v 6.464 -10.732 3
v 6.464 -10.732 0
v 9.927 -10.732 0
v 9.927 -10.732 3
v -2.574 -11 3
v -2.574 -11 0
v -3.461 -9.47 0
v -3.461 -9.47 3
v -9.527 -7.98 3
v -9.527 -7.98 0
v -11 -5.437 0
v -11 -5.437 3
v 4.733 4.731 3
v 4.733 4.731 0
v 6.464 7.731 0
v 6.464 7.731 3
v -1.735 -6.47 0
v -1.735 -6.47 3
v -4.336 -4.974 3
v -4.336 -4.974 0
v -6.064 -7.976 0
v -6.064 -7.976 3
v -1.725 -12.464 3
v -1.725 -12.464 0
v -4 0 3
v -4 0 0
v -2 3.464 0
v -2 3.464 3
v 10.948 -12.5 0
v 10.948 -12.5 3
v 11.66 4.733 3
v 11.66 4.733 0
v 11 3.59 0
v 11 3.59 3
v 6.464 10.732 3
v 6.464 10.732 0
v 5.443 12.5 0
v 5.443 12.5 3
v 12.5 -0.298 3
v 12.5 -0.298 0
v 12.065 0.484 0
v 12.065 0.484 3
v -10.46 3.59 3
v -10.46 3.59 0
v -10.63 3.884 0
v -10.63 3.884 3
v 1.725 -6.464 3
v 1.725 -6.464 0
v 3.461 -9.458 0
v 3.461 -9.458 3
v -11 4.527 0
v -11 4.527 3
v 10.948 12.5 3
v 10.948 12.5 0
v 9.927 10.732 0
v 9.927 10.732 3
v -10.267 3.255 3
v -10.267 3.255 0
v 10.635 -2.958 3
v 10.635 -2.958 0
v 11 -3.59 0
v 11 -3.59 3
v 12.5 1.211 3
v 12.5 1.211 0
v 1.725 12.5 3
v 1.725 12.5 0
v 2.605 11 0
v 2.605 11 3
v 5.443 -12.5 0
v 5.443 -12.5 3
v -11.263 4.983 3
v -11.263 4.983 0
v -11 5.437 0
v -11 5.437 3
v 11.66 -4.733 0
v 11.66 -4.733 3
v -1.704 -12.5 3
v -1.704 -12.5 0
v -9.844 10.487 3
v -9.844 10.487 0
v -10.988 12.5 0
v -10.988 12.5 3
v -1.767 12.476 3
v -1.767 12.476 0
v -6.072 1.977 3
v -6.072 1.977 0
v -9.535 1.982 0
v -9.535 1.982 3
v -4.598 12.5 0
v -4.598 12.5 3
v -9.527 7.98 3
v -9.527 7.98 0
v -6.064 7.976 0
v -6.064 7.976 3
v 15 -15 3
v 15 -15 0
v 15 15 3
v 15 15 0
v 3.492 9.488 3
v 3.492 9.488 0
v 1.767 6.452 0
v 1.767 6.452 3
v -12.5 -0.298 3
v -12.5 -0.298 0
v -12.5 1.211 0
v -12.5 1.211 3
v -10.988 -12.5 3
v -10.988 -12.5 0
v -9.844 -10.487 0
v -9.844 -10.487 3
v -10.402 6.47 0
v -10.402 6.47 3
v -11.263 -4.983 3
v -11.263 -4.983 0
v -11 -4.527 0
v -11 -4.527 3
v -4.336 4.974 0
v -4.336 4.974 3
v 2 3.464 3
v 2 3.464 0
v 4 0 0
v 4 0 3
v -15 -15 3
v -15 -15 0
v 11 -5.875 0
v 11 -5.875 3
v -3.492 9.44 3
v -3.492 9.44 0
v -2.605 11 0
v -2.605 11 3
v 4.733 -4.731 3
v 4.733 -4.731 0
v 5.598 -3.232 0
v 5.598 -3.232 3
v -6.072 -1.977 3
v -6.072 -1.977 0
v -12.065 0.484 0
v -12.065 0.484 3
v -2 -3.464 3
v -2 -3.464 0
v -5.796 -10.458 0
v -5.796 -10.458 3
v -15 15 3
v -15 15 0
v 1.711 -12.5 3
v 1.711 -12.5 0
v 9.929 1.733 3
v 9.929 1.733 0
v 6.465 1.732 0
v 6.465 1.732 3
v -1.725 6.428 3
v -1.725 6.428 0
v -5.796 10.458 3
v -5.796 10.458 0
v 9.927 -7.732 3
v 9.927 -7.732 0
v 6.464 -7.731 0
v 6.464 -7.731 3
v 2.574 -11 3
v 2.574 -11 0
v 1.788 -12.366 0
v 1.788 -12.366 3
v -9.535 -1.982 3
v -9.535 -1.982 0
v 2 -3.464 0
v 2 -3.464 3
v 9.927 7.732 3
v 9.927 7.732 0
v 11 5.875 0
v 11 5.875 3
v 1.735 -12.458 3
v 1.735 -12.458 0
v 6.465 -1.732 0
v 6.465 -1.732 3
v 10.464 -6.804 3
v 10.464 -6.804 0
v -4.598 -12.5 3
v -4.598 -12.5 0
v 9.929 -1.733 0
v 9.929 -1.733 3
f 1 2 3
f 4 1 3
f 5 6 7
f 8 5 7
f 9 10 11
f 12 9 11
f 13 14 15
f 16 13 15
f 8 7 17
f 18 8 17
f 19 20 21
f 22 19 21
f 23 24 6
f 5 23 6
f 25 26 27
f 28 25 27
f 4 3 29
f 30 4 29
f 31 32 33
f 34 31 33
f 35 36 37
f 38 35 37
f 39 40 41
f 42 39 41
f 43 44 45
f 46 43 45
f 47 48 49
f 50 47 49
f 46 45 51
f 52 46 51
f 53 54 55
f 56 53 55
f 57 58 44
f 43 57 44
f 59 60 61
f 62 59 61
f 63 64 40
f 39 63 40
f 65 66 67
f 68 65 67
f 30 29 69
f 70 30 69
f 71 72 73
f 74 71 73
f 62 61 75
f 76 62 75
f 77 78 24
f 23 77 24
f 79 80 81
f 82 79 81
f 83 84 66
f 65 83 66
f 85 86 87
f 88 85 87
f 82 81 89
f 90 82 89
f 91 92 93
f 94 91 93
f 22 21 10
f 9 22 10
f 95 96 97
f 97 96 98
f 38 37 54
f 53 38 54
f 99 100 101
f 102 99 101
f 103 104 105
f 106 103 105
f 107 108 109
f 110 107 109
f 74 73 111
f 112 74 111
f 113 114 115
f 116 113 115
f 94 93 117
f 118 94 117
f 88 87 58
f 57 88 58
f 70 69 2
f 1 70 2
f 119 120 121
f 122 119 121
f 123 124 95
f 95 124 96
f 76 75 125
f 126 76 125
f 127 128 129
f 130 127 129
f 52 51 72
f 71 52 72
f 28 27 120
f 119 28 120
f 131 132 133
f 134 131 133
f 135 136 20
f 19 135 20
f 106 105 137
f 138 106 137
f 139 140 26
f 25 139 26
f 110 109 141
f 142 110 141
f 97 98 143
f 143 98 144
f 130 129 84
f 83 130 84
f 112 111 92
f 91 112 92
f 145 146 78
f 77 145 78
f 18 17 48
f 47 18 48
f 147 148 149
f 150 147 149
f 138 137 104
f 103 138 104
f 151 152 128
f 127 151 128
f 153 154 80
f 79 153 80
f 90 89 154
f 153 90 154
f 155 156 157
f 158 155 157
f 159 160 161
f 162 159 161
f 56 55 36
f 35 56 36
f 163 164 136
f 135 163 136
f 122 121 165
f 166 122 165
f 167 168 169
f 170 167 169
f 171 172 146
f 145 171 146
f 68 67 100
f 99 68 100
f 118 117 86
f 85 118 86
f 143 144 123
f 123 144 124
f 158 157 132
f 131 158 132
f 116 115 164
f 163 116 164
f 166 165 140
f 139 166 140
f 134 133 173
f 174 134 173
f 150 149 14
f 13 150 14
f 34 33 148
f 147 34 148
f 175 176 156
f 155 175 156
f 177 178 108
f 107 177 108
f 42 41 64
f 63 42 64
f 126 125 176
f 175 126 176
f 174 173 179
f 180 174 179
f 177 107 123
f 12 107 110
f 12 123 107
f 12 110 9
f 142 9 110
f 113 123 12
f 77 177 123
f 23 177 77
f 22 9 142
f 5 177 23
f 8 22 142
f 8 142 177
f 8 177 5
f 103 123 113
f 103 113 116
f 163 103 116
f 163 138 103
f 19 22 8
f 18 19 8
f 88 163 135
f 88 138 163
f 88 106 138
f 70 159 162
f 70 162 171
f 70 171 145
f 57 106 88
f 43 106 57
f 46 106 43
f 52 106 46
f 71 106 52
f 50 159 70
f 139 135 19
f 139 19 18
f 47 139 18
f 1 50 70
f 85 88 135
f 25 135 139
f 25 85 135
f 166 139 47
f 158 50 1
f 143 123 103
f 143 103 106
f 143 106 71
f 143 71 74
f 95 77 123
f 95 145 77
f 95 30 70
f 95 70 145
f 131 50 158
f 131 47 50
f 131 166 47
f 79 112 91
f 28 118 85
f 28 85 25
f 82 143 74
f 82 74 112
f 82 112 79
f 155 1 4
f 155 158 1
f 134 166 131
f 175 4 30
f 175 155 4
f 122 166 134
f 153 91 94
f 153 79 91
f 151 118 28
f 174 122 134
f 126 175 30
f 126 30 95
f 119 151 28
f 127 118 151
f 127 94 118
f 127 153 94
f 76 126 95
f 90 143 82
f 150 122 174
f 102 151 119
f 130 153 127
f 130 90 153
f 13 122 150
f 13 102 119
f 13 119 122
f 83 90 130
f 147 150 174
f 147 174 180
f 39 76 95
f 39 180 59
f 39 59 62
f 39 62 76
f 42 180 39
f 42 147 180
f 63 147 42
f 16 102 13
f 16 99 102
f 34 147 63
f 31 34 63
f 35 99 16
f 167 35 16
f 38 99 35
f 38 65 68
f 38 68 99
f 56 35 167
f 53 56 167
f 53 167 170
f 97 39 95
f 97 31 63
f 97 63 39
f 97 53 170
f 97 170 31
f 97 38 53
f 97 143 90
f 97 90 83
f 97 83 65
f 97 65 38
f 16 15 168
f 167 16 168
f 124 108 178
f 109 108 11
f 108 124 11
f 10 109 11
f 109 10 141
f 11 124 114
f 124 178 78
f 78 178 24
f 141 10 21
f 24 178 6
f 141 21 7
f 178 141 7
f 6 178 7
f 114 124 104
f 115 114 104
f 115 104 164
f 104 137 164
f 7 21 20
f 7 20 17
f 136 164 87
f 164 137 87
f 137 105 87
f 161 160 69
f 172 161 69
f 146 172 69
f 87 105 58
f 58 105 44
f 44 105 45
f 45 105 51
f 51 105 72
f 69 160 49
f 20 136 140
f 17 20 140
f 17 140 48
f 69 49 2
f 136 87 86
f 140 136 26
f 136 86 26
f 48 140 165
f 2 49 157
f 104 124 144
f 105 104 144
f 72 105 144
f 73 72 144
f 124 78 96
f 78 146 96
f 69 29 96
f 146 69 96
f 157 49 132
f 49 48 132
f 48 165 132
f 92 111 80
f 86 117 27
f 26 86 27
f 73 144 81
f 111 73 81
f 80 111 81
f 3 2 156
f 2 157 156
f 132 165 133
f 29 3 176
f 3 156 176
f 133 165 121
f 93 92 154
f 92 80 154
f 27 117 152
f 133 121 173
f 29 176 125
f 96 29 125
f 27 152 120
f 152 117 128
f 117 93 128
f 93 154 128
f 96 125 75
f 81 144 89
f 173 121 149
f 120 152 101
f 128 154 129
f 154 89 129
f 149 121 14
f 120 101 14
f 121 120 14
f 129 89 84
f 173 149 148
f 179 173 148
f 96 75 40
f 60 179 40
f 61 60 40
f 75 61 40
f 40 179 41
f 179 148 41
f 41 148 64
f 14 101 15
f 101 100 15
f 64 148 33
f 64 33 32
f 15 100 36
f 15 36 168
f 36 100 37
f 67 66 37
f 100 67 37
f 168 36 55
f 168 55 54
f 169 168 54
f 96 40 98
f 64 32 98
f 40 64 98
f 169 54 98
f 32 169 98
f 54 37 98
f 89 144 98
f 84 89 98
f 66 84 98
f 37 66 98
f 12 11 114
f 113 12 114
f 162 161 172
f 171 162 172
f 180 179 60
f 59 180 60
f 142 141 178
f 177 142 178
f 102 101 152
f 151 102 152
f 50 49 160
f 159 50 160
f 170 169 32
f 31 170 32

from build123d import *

# Parameters (mm, degrees)
SALIENTE_EXTRUIR3_DEPTH = 3


with BuildPart() as part:
    # Croquis1 → Saliente-Extruir3 (new body)
    with BuildSketch(Plane.XY):
        Polygon((-11.260603559, 15), (-15, 15), (-15, 3.468631071), (-15, -2.593220906), (-15, -15), (15, -15), (15, 15), (10.926682634, 15), (5.464101822, 15), (-4.343979365, 15), align=None)
        Polygon((-4.598156154, -12.5), (-10.987751023, -12.5), (-9.843926146, -10.486593018), (-5.795898544, -10.458408789), align=None, mode=Mode.SUBTRACT)
        Polygon((-1.735474056, -6.470030855), (1.725204311, -6.464101615), (3.460678367, -9.458172375), (2.574022478, -11), (1.788213156, -12.366463064), (1.735474056, -12.458172375), (1.711420323, -12.5), (-1.70439628, -12.5), (-1.725204311, -12.464101615), (-2.573851712, -11), (-3.460678367, -9.470030855), align=None, mode=Mode.SUBTRACT)
        Polygon((-9.52712635, -7.980422404), (-11, -5.43688968), (-11.262605478, -4.983391428), (-11, -4.527191603), (-9.53484008, -1.981906927), (-6.071595554, -1.977453403), (-4.336116426, -4.974484379), (-6.063881824, -7.97596888), align=None, mode=Mode.SUBTRACT)
        Polygon((10.94791539, -12.5), (5.442868782, -12.5), (6.463594896, -10.732050867), (9.927189585, -10.732050867), align=None, mode=Mode.SUBTRACT)
        Polygon((2, 3.464101615), (4, 0), (2, -3.464101615), (-2, -3.464101615), (-4, 0), (-2, 3.464101615), align=None, mode=Mode.SUBTRACT)
        Polygon((9.928710122, -1.732928769), (10.635389239, -2.957649744), (11, -3.589543959), (11.659747147, -4.732928769), (11, -5.874975703), (10.463594724, -6.803513255), (9.927189448, -7.732050808), (6.463594724, -7.731172846), (4.732557699, -4.731172846), (5.598456213, -3.232270202), (6.465115398, -1.732050808), align=None, mode=Mode.SUBTRACT)
        Polygon((-12.064918104, 0.484419433), (-12.5, -0.297648548), (-12.5, 1.211047664), align=None, mode=Mode.SUBTRACT)
        Polygon((-9.52712635, 7.980422404), (-6.063881824, 7.97596888), (-4.336116426, 4.974484379), (-6.071595554, 1.977453403), (-9.53484008, 1.981906927), (-10.26742004, 3.254549265), (-10.460255366, 3.589543959), (-10.62999033, 3.884408567), (-11, 4.527191603), (-11.262605478, 4.983391428), (-11, 5.43688968), (-10.401742938, 6.470030855), align=None, mode=Mode.SUBTRACT)
        Polygon((-9.843926146, 10.486593018), (-10.987751023, 12.5), (-4.598156154, 12.5), (-5.795898544, 10.458408789), align=None, mode=Mode.SUBTRACT)
        Polygon((1.725204311, 12.5), (2.604960918, 11), (3.49176728, 9.487980048), (1.766562969, 6.452081663), (-1.725204311, 6.42820323), (-3.49176728, 9.440223182), (-2.605395818, 11), (-1.766562969, 12.476121567), align=None, mode=Mode.SUBTRACT)
        Polygon((12.5, 1.211047664), (12.5, -0.297648548), (12.064918104, 0.484419433), align=None, mode=Mode.SUBTRACT)
        Polygon((11, 3.589543959), (9.928710122, 1.732928769), (6.465115398, 1.732050808), (4.732557699, 4.731172846), (6.463594724, 7.731172846), (9.927189448, 7.732050808), (11, 5.874975703), (11.659747147, 4.732928769), align=None, mode=Mode.SUBTRACT)
        Polygon((6.463594896, 10.732050808), (5.442868954, 12.5), (10.947915528, 12.5), (9.927189585, 10.732050808), align=None, mode=Mode.SUBTRACT)
    extrude(amount=SALIENTE_EXTRUIR3_DEPTH)


solid = part.part
